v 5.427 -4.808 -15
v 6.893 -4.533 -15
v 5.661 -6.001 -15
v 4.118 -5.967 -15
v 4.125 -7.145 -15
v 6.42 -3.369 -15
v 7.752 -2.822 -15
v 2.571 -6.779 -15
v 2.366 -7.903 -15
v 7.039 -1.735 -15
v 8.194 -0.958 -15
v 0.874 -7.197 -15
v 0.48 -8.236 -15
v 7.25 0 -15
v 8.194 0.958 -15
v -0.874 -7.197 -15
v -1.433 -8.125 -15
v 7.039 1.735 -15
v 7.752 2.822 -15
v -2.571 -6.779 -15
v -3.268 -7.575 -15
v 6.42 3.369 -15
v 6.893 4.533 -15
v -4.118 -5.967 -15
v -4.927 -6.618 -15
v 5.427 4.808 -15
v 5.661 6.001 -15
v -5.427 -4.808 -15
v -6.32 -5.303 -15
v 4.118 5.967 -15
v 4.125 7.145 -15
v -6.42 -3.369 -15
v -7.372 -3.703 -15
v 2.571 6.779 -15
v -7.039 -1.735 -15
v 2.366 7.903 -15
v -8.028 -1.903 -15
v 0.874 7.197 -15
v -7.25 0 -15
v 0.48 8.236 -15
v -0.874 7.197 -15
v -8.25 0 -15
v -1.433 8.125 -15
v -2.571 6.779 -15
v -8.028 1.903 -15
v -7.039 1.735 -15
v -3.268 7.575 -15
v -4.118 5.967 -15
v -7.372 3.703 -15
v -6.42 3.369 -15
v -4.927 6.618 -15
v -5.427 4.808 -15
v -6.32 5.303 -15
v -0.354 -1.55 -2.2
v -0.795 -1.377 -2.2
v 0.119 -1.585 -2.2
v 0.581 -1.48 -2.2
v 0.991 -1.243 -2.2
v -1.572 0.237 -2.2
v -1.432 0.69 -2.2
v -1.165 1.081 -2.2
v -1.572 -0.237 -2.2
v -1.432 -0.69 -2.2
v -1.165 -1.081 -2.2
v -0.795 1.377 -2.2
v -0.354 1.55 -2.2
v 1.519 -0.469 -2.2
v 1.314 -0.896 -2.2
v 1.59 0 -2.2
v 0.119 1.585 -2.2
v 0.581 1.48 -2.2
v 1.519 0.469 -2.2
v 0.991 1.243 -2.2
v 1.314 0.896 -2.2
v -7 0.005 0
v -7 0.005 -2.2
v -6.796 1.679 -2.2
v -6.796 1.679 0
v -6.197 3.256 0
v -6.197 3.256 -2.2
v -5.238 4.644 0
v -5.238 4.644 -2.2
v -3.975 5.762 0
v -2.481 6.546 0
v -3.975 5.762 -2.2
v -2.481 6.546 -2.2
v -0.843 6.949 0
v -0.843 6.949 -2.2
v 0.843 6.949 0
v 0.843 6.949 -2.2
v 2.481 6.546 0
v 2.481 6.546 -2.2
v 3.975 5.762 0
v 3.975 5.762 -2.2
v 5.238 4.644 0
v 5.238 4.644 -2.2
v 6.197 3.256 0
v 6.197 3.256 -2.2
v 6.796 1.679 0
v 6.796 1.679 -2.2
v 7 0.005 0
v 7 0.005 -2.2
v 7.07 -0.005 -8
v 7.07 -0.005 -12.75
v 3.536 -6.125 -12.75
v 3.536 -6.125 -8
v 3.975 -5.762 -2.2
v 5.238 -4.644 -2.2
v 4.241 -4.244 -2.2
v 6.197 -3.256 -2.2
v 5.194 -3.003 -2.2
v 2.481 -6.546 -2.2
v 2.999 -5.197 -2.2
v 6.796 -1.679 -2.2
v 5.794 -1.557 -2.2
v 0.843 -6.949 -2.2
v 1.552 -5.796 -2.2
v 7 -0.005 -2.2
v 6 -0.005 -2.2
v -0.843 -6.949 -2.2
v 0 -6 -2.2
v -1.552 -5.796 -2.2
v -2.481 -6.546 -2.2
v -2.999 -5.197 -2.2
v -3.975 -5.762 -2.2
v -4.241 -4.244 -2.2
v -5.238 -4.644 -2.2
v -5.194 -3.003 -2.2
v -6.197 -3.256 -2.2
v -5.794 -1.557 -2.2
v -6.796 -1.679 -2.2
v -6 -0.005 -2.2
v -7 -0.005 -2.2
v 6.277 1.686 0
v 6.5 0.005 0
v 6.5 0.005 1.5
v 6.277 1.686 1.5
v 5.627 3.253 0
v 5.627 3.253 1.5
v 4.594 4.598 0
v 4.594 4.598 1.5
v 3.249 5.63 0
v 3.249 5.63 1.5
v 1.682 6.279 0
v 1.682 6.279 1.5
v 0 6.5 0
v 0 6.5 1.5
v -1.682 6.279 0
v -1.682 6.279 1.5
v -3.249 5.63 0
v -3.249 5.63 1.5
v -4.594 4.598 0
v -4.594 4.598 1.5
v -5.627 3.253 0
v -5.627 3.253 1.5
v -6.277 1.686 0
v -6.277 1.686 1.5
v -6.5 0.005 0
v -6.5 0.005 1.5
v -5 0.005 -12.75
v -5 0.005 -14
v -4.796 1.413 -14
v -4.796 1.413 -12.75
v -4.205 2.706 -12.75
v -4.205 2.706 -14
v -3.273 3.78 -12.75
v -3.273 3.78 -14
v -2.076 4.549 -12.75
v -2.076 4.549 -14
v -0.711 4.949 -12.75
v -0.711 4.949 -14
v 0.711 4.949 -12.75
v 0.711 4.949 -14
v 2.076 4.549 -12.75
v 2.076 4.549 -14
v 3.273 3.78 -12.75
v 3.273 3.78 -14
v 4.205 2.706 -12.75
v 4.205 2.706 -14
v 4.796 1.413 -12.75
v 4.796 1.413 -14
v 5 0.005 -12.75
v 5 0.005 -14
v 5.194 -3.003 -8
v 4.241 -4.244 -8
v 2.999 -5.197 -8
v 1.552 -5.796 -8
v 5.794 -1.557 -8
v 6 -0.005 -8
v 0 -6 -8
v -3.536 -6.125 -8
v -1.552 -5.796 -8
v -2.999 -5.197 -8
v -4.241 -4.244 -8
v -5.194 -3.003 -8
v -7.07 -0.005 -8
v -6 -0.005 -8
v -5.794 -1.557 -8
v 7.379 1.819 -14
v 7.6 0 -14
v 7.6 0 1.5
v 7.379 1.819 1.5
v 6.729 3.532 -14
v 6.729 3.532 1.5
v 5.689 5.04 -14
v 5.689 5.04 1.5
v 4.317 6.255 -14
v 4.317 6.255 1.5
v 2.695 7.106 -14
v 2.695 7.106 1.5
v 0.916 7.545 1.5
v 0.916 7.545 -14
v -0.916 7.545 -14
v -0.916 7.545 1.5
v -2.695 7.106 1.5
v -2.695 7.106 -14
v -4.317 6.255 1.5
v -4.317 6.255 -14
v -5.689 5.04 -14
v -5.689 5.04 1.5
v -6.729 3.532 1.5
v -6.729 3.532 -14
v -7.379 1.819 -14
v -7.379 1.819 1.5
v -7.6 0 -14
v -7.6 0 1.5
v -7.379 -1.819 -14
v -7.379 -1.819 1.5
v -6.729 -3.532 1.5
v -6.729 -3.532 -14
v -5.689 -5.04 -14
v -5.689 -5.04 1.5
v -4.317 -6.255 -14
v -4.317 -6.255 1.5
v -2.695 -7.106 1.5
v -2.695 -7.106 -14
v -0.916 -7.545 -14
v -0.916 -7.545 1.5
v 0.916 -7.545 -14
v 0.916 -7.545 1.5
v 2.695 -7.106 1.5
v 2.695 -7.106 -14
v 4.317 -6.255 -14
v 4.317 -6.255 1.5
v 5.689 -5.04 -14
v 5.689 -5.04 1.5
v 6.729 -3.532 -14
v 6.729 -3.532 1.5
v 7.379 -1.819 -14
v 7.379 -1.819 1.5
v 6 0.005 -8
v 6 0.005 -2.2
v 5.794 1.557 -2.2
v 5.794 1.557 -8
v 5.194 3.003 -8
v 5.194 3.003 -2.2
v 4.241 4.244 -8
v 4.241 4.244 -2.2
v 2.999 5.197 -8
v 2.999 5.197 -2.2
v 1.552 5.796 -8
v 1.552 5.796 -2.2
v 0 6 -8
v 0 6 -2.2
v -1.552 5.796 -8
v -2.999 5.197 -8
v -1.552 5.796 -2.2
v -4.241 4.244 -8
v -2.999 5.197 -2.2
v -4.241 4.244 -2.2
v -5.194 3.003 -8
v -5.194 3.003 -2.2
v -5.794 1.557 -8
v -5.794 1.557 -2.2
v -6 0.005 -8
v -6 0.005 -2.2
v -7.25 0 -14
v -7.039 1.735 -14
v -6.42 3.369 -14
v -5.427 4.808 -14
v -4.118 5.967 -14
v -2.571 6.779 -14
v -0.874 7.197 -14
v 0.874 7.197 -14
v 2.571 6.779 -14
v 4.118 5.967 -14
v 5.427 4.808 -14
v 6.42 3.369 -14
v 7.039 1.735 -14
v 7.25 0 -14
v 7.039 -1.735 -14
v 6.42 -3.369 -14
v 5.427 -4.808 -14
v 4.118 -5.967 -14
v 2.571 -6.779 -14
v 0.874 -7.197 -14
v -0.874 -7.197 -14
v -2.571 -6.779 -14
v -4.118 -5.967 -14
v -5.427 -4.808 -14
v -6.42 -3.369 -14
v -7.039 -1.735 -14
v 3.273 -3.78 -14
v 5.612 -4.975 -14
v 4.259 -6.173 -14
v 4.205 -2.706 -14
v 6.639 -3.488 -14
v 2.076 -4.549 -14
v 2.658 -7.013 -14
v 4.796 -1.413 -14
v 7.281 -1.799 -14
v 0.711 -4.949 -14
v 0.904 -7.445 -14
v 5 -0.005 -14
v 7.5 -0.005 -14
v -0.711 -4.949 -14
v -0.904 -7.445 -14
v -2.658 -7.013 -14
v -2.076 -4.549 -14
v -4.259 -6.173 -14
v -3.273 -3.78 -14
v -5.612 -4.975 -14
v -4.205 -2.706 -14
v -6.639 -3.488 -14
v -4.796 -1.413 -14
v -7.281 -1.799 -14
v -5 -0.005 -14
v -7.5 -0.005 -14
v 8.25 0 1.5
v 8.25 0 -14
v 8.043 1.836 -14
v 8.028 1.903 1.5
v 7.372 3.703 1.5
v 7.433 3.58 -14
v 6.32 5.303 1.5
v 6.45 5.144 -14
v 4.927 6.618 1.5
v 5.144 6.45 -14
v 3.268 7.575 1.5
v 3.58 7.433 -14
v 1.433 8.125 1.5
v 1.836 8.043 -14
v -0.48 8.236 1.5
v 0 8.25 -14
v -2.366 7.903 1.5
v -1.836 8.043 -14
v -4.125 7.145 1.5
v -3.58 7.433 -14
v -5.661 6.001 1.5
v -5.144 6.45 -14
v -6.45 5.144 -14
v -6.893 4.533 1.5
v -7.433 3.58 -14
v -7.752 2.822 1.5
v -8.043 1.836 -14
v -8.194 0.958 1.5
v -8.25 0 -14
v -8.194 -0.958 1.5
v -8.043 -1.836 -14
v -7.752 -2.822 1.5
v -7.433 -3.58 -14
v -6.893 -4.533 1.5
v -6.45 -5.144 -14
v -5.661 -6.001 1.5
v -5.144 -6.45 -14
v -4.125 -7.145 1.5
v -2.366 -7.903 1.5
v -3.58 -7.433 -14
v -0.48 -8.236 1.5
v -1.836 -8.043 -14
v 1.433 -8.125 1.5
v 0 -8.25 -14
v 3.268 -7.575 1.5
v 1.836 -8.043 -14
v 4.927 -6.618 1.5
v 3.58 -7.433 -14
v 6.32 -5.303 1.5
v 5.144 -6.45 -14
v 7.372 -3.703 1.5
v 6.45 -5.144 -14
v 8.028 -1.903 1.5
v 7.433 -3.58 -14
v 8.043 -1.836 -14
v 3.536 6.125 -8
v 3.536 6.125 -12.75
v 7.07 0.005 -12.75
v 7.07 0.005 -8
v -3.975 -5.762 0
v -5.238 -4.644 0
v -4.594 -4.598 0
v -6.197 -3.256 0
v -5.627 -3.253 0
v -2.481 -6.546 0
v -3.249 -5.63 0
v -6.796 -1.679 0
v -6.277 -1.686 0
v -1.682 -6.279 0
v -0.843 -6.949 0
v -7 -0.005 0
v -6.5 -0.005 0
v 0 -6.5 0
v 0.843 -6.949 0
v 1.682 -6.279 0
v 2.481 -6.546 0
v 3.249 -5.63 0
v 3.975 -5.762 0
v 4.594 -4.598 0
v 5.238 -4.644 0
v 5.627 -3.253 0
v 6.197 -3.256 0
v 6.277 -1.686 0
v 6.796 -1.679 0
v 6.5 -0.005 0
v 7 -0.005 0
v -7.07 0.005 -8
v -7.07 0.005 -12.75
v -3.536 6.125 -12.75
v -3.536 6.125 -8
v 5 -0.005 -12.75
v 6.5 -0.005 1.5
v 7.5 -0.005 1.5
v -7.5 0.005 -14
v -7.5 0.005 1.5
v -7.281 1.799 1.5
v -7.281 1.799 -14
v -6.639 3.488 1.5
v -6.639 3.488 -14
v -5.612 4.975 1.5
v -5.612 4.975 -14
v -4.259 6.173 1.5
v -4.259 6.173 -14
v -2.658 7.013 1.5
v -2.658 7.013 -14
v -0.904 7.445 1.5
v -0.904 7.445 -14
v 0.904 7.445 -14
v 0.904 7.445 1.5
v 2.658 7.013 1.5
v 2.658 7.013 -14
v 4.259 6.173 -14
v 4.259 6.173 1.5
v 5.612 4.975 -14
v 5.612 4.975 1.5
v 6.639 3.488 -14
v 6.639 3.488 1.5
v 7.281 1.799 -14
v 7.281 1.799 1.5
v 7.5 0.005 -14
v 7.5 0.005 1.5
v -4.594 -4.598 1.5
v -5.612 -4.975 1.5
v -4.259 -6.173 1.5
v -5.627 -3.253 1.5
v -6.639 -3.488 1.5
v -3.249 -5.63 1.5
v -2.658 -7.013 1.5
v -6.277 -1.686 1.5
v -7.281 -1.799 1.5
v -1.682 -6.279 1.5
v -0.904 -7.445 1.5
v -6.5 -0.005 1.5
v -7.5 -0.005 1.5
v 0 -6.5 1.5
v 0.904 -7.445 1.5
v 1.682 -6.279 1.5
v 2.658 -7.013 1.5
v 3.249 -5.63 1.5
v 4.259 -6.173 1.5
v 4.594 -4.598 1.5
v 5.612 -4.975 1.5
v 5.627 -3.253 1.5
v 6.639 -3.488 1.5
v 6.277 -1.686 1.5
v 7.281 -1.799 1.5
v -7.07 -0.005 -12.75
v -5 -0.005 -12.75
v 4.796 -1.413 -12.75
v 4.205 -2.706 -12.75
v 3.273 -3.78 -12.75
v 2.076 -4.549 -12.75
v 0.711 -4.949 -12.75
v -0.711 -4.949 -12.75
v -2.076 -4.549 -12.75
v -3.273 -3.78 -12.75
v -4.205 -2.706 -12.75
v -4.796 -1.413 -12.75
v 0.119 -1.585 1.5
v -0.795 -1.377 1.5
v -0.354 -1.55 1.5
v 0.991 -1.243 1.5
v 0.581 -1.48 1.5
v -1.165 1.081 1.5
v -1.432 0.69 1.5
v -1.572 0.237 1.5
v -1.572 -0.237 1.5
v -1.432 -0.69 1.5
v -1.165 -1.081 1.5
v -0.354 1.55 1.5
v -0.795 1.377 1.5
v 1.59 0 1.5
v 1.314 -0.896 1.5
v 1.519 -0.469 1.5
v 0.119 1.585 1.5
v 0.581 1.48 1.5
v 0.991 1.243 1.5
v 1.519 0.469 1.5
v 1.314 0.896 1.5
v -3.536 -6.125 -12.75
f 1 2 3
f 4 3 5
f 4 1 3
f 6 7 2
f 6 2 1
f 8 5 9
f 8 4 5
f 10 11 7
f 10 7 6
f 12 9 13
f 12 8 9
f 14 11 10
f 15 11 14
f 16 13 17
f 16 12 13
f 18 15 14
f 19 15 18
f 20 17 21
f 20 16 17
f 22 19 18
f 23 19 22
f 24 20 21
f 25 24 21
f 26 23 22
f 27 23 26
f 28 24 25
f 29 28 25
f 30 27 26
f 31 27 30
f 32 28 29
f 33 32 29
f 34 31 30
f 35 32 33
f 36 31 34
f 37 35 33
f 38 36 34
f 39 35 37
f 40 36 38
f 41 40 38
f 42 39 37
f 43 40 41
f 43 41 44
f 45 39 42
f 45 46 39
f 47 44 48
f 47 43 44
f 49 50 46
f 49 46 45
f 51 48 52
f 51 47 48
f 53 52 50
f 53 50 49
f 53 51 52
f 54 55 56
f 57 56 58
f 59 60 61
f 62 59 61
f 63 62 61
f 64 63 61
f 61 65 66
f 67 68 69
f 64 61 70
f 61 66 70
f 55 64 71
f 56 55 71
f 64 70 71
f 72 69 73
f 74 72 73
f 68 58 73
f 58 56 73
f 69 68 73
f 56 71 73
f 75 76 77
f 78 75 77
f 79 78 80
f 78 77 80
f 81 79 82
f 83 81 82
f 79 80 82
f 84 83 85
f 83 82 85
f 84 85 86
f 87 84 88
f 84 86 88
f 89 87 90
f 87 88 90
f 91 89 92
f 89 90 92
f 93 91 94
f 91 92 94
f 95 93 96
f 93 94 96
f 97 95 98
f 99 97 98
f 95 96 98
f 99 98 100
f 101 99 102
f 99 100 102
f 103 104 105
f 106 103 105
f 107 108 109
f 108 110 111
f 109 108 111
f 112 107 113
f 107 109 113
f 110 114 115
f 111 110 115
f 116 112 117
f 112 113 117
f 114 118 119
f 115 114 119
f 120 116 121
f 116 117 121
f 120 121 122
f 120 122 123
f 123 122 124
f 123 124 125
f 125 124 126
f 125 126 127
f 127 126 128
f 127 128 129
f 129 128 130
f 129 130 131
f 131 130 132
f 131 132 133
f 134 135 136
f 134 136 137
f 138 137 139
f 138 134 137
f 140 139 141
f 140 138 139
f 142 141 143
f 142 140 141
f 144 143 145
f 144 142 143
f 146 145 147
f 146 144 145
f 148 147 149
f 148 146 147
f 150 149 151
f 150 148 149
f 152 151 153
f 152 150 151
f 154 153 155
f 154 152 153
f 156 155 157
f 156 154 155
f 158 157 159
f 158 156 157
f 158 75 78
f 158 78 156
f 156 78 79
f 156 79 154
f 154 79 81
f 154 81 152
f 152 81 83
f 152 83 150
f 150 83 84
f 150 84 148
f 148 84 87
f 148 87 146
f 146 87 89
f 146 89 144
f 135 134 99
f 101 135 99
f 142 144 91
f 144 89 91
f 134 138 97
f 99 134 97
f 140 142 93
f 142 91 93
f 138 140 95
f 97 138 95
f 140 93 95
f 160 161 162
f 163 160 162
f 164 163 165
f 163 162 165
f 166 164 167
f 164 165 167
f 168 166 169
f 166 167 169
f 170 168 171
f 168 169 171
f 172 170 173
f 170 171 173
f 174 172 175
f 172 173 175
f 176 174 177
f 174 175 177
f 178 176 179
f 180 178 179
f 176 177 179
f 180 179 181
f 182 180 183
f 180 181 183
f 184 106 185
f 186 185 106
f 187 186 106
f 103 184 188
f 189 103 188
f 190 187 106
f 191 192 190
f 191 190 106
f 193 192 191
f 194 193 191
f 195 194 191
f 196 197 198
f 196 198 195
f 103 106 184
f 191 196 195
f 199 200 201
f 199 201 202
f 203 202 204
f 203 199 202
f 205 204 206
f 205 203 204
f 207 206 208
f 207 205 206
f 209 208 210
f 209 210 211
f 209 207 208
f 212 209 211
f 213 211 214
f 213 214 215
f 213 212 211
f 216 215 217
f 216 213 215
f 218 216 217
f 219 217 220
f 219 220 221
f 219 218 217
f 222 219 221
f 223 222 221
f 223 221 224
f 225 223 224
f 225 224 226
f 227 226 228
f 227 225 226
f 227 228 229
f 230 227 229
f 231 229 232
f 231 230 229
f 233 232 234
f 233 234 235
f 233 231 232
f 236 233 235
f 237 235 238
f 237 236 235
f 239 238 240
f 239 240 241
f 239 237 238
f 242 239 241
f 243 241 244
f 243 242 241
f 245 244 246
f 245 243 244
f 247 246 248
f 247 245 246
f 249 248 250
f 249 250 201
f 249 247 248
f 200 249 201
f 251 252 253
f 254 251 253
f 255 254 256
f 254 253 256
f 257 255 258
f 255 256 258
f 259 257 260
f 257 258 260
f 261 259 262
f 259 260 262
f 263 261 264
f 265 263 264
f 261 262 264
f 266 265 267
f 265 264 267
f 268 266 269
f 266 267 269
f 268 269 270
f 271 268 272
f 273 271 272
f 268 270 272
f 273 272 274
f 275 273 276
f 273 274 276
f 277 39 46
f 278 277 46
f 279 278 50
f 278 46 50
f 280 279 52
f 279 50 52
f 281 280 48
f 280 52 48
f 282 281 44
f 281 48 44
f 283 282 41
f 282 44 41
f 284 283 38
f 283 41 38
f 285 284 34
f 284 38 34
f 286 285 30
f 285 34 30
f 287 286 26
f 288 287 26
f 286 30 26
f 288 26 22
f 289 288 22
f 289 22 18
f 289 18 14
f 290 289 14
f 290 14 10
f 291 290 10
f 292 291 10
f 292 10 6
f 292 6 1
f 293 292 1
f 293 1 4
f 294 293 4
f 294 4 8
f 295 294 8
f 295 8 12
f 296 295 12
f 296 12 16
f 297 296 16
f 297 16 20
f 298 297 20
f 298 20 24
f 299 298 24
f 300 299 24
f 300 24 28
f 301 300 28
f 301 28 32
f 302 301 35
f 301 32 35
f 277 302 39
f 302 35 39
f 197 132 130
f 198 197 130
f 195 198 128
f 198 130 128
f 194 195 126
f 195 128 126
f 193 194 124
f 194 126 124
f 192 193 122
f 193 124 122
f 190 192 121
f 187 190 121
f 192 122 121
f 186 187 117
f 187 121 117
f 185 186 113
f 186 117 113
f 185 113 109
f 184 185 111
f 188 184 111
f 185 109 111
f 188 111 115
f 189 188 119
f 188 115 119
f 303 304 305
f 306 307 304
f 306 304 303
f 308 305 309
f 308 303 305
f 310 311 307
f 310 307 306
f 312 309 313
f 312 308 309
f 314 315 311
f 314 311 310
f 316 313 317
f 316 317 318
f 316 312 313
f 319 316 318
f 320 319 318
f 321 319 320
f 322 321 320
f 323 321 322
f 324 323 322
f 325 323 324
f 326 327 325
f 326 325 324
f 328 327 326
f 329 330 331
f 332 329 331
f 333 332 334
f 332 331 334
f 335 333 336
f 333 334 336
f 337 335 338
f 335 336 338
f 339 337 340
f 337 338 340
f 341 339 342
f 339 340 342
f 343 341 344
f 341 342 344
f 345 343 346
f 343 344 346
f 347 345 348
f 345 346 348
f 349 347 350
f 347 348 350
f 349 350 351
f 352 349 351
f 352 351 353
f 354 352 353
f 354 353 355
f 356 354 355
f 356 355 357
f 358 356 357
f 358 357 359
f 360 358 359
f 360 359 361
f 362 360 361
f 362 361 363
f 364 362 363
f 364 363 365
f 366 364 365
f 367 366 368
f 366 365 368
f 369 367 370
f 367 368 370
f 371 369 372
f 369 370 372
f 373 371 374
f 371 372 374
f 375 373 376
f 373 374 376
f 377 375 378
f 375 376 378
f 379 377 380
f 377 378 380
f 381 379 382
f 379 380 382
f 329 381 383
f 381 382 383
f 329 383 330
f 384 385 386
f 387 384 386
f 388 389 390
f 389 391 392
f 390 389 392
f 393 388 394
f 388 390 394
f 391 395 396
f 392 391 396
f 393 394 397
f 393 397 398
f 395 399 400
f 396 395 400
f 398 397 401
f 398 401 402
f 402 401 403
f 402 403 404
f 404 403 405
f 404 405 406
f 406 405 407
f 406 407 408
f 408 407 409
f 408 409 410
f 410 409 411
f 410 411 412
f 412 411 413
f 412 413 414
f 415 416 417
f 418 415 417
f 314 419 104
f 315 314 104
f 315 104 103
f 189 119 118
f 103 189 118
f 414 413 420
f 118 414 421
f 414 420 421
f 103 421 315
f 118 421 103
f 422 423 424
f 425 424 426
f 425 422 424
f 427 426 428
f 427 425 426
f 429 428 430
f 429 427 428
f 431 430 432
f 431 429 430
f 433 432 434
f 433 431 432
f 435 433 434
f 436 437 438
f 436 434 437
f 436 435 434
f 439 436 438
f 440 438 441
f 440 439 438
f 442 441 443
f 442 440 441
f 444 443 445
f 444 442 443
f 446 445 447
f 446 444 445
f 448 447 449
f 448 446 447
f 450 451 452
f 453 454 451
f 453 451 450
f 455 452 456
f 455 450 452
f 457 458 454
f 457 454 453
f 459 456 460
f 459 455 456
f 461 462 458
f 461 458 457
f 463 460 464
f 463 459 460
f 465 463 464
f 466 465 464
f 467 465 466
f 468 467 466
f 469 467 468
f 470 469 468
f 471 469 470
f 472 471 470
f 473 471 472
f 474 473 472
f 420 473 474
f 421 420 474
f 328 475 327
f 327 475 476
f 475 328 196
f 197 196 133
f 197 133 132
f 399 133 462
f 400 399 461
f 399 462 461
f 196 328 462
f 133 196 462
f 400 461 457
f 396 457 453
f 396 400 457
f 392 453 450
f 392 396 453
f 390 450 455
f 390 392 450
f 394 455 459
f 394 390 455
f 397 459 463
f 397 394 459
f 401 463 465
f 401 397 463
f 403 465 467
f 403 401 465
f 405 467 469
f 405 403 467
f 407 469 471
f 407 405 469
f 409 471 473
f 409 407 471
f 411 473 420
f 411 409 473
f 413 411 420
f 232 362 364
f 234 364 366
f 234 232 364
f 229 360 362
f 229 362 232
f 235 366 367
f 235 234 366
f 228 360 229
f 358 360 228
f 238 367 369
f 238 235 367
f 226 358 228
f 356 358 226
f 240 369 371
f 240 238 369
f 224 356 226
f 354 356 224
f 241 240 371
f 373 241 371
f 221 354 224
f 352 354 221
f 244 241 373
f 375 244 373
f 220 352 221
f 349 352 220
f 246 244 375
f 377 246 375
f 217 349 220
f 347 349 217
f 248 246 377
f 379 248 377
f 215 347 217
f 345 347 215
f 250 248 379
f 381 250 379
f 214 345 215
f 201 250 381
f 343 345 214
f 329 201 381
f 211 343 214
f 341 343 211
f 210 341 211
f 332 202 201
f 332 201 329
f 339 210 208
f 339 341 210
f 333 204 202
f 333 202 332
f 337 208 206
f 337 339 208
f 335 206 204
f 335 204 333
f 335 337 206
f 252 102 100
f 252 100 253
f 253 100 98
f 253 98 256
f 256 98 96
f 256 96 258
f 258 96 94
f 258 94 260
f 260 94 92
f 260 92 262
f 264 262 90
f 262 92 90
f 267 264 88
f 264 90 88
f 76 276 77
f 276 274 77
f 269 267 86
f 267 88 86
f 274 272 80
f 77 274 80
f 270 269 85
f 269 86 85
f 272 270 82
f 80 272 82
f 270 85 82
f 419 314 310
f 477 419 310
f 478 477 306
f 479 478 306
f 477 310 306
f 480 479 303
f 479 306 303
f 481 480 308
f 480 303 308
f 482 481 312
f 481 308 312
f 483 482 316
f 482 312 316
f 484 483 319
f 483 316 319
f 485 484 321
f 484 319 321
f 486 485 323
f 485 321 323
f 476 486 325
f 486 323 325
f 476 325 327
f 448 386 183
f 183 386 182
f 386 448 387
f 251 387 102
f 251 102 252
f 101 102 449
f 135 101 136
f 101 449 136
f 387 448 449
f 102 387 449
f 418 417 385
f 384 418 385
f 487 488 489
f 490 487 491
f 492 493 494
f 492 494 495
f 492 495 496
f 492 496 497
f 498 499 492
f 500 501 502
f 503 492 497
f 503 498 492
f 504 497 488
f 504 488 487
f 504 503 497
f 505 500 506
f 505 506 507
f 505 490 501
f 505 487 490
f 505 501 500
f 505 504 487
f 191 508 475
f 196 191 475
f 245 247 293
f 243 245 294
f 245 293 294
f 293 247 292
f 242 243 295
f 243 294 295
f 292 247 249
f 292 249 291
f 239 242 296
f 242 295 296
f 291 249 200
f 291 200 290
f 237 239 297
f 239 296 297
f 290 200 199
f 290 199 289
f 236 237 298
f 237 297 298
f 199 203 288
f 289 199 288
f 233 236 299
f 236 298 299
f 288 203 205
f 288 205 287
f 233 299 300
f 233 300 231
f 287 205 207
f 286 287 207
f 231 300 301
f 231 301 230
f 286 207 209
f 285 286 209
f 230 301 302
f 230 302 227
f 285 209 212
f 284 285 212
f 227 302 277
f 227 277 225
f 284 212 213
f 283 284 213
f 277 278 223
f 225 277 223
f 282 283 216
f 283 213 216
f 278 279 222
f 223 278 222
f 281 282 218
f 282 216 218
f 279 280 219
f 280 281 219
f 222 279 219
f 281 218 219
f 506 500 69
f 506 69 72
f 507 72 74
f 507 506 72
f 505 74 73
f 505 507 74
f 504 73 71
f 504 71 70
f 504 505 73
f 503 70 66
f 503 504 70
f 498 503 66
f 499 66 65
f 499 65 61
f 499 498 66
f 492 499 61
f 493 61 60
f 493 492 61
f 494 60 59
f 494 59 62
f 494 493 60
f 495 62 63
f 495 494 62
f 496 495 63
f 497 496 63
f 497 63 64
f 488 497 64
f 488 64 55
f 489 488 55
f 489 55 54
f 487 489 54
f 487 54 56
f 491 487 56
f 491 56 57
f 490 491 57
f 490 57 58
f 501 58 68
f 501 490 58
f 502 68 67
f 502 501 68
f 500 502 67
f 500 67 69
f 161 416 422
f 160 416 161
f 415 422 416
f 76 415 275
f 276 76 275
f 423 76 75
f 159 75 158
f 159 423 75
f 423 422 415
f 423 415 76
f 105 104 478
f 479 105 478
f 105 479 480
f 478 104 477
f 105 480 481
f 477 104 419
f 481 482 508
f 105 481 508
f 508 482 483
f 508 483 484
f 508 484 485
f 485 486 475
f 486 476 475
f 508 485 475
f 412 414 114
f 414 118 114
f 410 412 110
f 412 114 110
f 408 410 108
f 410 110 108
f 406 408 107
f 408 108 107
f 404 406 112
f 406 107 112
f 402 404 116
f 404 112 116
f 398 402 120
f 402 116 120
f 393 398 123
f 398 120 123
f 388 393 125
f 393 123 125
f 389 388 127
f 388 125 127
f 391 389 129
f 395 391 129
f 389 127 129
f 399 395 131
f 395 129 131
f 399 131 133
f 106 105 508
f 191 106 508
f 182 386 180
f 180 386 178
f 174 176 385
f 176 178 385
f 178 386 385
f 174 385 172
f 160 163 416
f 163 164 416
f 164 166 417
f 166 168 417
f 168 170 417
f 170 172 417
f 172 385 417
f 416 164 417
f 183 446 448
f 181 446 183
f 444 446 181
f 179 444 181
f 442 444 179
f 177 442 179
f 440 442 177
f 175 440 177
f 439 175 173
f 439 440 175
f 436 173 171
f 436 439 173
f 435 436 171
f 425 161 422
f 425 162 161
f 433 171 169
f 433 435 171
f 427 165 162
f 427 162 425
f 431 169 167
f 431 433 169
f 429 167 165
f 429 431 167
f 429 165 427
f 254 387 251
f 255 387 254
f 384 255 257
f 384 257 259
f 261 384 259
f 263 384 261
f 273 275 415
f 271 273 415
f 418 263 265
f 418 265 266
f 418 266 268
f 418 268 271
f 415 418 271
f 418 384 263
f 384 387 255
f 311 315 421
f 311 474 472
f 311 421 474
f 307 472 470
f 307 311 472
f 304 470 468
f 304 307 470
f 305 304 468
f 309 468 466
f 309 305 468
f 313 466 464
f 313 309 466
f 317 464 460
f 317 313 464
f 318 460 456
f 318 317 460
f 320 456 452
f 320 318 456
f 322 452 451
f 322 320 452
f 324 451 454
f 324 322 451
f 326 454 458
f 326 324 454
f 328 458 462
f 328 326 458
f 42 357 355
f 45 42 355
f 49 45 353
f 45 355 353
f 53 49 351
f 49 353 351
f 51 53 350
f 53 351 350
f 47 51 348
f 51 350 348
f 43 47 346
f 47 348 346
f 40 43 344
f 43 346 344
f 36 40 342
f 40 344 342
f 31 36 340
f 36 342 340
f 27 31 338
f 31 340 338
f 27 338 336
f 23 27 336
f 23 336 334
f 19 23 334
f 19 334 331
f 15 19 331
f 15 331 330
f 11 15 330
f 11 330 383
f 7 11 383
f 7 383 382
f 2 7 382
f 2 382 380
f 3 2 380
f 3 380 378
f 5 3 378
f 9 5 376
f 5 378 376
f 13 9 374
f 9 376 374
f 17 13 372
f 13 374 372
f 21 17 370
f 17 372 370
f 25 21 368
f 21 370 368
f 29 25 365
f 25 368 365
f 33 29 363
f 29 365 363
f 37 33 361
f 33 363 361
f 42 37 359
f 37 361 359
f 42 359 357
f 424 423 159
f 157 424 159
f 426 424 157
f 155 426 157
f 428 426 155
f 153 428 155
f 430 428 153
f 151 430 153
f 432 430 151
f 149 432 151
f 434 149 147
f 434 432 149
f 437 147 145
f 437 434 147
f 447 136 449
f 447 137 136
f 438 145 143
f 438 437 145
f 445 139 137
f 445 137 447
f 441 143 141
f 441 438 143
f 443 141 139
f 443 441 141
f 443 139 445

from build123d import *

# Parameters (mm, degrees)
SKETCH1_R            = 7.5
SKETCH1_R_2          = 6.5
BOSS_EXTRUDE1_DEPTH  = 1.5
BOSS_EXTRUDE2_START  = 8
SKETCH2_R            = 7.5
SKETCH2_R_2          = 7
BOSS_EXTRUDE2_DEPTH  = 8
BOSS_EXTRUDE3_START  = 4.75
SKETCH3_R            = 7.5
BOSS_EXTRUDE3_DEPTH  = 4.75
BOSS_EXTRUDE4_START  = 1.25
SKETCH4_R            = 7.5
SKETCH4_R_2          = 5
BOSS_EXTRUDE4_DEPTH  = 1.25
CUT_EXTRUDE1_REACH   = 20.782
SKETCH5_W            = 16.797198
SKETCH5_H            = 0.01
SKETCH6_R            = 8.25
BOSS_EXTRUDE5_DEPTH  = 1
SKETCH7_R            = 8.25
SKETCH7_R_2          = 7.6
BOSS_EXTRUDE6_DEPTH  = 15.5
SKETCH8_R            = 7.25
CUT_EXTRUDE2_DEPTH   = 16.5
SKETCH11_R           = 1.58979
BOSS_EXTRUDE8_DEPTH  = 3.7
BOSS_EXTRUDE10_DEPTH = 5.8


with BuildPart() as part:
    # Sketch1 → Boss-Extrude1 (new body)
    with BuildSketch(Plane.XY):
        Circle(SKETCH1_R)
        Circle(SKETCH1_R_2, mode=Mode.SUBTRACT)
    extrude(amount=BOSS_EXTRUDE1_DEPTH)

    # Sketch2 → Boss-Extrude2 (add)
    with BuildSketch(Plane(origin=(0, 0, 0), x_dir=(-1, 0, 0), z_dir=(0, 0, -1)).offset(BOSS_EXTRUDE2_START)):
        Circle(SKETCH2_R)
        Circle(SKETCH2_R_2, mode=Mode.SUBTRACT)
    extrude(amount=-BOSS_EXTRUDE2_DEPTH)

    # Sketch3 → Boss-Extrude3 (add)
    with BuildSketch(Plane(origin=(0, 0, -8), x_dir=(-1, 0, 0), z_dir=(0, 0, -1)).offset(BOSS_EXTRUDE3_START)):
        Circle(SKETCH3_R)
        Polygon((-7.072541, 0), (-3.53627, -6.125), (3.53627, -6.125), (7.072541, 0), (3.53627, 6.125), (-3.53627, 6.125), align=None, mode=Mode.SUBTRACT)
    extrude(amount=-BOSS_EXTRUDE3_DEPTH)

    # Sketch4 → Boss-Extrude4 (add)
    with BuildSketch(Plane(origin=(0, 0, -12.75), x_dir=(-1, 0, 0), z_dir=(0, 0, -1)).offset(BOSS_EXTRUDE4_START)):
        Circle(SKETCH4_R)
        Circle(SKETCH4_R_2, mode=Mode.SUBTRACT)
    extrude(amount=-BOSS_EXTRUDE4_DEPTH)

    # Cut-Extrude1: up to this face of the body (flat: up to its plane)
    cut_extrude1_end = Plane(part.part.faces().sort_by_distance((7.287868, 0, -14))[0])
    # Sketch5 → Cut-Extrude1 (cut, up to the picked face)
    with BuildSketch(Plane.XY.offset(1.5), mode=Mode.PRIVATE) as cut_extrude1_sk1:
        with Locations((-0.172406, 0)):
            Rectangle(SKETCH5_W, SKETCH5_H)
    cut_extrude1_tool1 = split(extrude(cut_extrude1_sk1.sketch, amount=-CUT_EXTRUDE1_REACH, mode=Mode.PRIVATE), bisect_by=cut_extrude1_end, keep=Keep.BOTH, mode=Mode.PRIVATE)
    add(cut_extrude1_tool1.solids().sort_by(Axis((-0.172406, 0, 1.5), (0, 0, -1)))[0], mode=Mode.SUBTRACT)


with BuildPart() as cut_extrude1_piece_1:
    # of the separate pieces the step leaves, piece 1, a body of its own (cut_extrude1_pieces)
    add(part.part.solids().sort_by_distance((7.499998, -0.005, -14))[0])



with BuildPart() as cut_extrude1_piece_2:
    # of the separate pieces the step leaves, piece 2, a body of its own (cut_extrude1_pieces)
    add(part.part.solids().sort_by_distance((-7.499998, 0.005, -14))[0])


with BuildPart() as body_3:
    # Sketch6 → Boss-Extrude5 (new body)
    with BuildSketch(Plane(origin=(0, 0, -14), x_dir=(-1, 0, 0), z_dir=(0, 0, -1))):
        Circle(SKETCH6_R)
    extrude(amount=BOSS_EXTRUDE5_DEPTH)

    # Sketch7 → Boss-Extrude6 (add)
    with BuildSketch(Plane.XY.offset(-14)):
        Circle(SKETCH7_R)
        Circle(SKETCH7_R_2, mode=Mode.SUBTRACT)
    extrude(amount=BOSS_EXTRUDE6_DEPTH)

    # Sketch8 → Cut-Extrude2 (cut)
    with BuildSketch(Plane(origin=(0, 0, -15), x_dir=(-1, 0, 0), z_dir=(0, 0, -1))):
        Circle(SKETCH8_R)
    extrude(amount=-CUT_EXTRUDE2_DEPTH, mode=Mode.SUBTRACT)


with BuildPart() as body_4:
    # Sketch11 → Boss-Extrude8 (new body)
    with BuildSketch(Plane.XY.offset(1.5)):
        Circle(SKETCH11_R)
    extrude(amount=-BOSS_EXTRUDE8_DEPTH)


with BuildPart() as cut_extrude1_piece_1_1:
    add(cut_extrude1_piece_1.part)

    add(cut_extrude1_piece_2.part)  # Boss-Extrude10 merges Cut-Extrude1 piece 2
    # Sketch12 → Boss-Extrude10 (add)
    with BuildSketch(Plane(origin=(0, 0, -2.2), x_dir=(-1, 0, 0), z_dir=(0, 0, -1))):
        with BuildLine():
            ThreePointArc((7.499998, 0.005), (0, 7.5), (-7.499998, 0.005))
            Line((-7.499998, 0.005), (-5.999998, 0.005))
            ThreePointArc((-5.999998, 0.005), (0, 6), (5.999998, 0.005))
            Line((5.999998, 0.005), (7.499998, 0.005))
        make_face()
        with BuildLine():
            Line((-5.999998, -0.005), (-7.499998, -0.005))
            ThreePointArc((-7.499998, -0.005), (0, -7.5), (7.499998, -0.005))
            Line((7.499998, -0.005), (5.999998, -0.005))
            ThreePointArc((5.999998, -0.005), (0, -6), (-5.999998, -0.005))
        make_face()
    extrude(amount=BOSS_EXTRUDE10_DEPTH)


solid = Compound([body_3.part, body_4.part, cut_extrude1_piece_1_1.part])
